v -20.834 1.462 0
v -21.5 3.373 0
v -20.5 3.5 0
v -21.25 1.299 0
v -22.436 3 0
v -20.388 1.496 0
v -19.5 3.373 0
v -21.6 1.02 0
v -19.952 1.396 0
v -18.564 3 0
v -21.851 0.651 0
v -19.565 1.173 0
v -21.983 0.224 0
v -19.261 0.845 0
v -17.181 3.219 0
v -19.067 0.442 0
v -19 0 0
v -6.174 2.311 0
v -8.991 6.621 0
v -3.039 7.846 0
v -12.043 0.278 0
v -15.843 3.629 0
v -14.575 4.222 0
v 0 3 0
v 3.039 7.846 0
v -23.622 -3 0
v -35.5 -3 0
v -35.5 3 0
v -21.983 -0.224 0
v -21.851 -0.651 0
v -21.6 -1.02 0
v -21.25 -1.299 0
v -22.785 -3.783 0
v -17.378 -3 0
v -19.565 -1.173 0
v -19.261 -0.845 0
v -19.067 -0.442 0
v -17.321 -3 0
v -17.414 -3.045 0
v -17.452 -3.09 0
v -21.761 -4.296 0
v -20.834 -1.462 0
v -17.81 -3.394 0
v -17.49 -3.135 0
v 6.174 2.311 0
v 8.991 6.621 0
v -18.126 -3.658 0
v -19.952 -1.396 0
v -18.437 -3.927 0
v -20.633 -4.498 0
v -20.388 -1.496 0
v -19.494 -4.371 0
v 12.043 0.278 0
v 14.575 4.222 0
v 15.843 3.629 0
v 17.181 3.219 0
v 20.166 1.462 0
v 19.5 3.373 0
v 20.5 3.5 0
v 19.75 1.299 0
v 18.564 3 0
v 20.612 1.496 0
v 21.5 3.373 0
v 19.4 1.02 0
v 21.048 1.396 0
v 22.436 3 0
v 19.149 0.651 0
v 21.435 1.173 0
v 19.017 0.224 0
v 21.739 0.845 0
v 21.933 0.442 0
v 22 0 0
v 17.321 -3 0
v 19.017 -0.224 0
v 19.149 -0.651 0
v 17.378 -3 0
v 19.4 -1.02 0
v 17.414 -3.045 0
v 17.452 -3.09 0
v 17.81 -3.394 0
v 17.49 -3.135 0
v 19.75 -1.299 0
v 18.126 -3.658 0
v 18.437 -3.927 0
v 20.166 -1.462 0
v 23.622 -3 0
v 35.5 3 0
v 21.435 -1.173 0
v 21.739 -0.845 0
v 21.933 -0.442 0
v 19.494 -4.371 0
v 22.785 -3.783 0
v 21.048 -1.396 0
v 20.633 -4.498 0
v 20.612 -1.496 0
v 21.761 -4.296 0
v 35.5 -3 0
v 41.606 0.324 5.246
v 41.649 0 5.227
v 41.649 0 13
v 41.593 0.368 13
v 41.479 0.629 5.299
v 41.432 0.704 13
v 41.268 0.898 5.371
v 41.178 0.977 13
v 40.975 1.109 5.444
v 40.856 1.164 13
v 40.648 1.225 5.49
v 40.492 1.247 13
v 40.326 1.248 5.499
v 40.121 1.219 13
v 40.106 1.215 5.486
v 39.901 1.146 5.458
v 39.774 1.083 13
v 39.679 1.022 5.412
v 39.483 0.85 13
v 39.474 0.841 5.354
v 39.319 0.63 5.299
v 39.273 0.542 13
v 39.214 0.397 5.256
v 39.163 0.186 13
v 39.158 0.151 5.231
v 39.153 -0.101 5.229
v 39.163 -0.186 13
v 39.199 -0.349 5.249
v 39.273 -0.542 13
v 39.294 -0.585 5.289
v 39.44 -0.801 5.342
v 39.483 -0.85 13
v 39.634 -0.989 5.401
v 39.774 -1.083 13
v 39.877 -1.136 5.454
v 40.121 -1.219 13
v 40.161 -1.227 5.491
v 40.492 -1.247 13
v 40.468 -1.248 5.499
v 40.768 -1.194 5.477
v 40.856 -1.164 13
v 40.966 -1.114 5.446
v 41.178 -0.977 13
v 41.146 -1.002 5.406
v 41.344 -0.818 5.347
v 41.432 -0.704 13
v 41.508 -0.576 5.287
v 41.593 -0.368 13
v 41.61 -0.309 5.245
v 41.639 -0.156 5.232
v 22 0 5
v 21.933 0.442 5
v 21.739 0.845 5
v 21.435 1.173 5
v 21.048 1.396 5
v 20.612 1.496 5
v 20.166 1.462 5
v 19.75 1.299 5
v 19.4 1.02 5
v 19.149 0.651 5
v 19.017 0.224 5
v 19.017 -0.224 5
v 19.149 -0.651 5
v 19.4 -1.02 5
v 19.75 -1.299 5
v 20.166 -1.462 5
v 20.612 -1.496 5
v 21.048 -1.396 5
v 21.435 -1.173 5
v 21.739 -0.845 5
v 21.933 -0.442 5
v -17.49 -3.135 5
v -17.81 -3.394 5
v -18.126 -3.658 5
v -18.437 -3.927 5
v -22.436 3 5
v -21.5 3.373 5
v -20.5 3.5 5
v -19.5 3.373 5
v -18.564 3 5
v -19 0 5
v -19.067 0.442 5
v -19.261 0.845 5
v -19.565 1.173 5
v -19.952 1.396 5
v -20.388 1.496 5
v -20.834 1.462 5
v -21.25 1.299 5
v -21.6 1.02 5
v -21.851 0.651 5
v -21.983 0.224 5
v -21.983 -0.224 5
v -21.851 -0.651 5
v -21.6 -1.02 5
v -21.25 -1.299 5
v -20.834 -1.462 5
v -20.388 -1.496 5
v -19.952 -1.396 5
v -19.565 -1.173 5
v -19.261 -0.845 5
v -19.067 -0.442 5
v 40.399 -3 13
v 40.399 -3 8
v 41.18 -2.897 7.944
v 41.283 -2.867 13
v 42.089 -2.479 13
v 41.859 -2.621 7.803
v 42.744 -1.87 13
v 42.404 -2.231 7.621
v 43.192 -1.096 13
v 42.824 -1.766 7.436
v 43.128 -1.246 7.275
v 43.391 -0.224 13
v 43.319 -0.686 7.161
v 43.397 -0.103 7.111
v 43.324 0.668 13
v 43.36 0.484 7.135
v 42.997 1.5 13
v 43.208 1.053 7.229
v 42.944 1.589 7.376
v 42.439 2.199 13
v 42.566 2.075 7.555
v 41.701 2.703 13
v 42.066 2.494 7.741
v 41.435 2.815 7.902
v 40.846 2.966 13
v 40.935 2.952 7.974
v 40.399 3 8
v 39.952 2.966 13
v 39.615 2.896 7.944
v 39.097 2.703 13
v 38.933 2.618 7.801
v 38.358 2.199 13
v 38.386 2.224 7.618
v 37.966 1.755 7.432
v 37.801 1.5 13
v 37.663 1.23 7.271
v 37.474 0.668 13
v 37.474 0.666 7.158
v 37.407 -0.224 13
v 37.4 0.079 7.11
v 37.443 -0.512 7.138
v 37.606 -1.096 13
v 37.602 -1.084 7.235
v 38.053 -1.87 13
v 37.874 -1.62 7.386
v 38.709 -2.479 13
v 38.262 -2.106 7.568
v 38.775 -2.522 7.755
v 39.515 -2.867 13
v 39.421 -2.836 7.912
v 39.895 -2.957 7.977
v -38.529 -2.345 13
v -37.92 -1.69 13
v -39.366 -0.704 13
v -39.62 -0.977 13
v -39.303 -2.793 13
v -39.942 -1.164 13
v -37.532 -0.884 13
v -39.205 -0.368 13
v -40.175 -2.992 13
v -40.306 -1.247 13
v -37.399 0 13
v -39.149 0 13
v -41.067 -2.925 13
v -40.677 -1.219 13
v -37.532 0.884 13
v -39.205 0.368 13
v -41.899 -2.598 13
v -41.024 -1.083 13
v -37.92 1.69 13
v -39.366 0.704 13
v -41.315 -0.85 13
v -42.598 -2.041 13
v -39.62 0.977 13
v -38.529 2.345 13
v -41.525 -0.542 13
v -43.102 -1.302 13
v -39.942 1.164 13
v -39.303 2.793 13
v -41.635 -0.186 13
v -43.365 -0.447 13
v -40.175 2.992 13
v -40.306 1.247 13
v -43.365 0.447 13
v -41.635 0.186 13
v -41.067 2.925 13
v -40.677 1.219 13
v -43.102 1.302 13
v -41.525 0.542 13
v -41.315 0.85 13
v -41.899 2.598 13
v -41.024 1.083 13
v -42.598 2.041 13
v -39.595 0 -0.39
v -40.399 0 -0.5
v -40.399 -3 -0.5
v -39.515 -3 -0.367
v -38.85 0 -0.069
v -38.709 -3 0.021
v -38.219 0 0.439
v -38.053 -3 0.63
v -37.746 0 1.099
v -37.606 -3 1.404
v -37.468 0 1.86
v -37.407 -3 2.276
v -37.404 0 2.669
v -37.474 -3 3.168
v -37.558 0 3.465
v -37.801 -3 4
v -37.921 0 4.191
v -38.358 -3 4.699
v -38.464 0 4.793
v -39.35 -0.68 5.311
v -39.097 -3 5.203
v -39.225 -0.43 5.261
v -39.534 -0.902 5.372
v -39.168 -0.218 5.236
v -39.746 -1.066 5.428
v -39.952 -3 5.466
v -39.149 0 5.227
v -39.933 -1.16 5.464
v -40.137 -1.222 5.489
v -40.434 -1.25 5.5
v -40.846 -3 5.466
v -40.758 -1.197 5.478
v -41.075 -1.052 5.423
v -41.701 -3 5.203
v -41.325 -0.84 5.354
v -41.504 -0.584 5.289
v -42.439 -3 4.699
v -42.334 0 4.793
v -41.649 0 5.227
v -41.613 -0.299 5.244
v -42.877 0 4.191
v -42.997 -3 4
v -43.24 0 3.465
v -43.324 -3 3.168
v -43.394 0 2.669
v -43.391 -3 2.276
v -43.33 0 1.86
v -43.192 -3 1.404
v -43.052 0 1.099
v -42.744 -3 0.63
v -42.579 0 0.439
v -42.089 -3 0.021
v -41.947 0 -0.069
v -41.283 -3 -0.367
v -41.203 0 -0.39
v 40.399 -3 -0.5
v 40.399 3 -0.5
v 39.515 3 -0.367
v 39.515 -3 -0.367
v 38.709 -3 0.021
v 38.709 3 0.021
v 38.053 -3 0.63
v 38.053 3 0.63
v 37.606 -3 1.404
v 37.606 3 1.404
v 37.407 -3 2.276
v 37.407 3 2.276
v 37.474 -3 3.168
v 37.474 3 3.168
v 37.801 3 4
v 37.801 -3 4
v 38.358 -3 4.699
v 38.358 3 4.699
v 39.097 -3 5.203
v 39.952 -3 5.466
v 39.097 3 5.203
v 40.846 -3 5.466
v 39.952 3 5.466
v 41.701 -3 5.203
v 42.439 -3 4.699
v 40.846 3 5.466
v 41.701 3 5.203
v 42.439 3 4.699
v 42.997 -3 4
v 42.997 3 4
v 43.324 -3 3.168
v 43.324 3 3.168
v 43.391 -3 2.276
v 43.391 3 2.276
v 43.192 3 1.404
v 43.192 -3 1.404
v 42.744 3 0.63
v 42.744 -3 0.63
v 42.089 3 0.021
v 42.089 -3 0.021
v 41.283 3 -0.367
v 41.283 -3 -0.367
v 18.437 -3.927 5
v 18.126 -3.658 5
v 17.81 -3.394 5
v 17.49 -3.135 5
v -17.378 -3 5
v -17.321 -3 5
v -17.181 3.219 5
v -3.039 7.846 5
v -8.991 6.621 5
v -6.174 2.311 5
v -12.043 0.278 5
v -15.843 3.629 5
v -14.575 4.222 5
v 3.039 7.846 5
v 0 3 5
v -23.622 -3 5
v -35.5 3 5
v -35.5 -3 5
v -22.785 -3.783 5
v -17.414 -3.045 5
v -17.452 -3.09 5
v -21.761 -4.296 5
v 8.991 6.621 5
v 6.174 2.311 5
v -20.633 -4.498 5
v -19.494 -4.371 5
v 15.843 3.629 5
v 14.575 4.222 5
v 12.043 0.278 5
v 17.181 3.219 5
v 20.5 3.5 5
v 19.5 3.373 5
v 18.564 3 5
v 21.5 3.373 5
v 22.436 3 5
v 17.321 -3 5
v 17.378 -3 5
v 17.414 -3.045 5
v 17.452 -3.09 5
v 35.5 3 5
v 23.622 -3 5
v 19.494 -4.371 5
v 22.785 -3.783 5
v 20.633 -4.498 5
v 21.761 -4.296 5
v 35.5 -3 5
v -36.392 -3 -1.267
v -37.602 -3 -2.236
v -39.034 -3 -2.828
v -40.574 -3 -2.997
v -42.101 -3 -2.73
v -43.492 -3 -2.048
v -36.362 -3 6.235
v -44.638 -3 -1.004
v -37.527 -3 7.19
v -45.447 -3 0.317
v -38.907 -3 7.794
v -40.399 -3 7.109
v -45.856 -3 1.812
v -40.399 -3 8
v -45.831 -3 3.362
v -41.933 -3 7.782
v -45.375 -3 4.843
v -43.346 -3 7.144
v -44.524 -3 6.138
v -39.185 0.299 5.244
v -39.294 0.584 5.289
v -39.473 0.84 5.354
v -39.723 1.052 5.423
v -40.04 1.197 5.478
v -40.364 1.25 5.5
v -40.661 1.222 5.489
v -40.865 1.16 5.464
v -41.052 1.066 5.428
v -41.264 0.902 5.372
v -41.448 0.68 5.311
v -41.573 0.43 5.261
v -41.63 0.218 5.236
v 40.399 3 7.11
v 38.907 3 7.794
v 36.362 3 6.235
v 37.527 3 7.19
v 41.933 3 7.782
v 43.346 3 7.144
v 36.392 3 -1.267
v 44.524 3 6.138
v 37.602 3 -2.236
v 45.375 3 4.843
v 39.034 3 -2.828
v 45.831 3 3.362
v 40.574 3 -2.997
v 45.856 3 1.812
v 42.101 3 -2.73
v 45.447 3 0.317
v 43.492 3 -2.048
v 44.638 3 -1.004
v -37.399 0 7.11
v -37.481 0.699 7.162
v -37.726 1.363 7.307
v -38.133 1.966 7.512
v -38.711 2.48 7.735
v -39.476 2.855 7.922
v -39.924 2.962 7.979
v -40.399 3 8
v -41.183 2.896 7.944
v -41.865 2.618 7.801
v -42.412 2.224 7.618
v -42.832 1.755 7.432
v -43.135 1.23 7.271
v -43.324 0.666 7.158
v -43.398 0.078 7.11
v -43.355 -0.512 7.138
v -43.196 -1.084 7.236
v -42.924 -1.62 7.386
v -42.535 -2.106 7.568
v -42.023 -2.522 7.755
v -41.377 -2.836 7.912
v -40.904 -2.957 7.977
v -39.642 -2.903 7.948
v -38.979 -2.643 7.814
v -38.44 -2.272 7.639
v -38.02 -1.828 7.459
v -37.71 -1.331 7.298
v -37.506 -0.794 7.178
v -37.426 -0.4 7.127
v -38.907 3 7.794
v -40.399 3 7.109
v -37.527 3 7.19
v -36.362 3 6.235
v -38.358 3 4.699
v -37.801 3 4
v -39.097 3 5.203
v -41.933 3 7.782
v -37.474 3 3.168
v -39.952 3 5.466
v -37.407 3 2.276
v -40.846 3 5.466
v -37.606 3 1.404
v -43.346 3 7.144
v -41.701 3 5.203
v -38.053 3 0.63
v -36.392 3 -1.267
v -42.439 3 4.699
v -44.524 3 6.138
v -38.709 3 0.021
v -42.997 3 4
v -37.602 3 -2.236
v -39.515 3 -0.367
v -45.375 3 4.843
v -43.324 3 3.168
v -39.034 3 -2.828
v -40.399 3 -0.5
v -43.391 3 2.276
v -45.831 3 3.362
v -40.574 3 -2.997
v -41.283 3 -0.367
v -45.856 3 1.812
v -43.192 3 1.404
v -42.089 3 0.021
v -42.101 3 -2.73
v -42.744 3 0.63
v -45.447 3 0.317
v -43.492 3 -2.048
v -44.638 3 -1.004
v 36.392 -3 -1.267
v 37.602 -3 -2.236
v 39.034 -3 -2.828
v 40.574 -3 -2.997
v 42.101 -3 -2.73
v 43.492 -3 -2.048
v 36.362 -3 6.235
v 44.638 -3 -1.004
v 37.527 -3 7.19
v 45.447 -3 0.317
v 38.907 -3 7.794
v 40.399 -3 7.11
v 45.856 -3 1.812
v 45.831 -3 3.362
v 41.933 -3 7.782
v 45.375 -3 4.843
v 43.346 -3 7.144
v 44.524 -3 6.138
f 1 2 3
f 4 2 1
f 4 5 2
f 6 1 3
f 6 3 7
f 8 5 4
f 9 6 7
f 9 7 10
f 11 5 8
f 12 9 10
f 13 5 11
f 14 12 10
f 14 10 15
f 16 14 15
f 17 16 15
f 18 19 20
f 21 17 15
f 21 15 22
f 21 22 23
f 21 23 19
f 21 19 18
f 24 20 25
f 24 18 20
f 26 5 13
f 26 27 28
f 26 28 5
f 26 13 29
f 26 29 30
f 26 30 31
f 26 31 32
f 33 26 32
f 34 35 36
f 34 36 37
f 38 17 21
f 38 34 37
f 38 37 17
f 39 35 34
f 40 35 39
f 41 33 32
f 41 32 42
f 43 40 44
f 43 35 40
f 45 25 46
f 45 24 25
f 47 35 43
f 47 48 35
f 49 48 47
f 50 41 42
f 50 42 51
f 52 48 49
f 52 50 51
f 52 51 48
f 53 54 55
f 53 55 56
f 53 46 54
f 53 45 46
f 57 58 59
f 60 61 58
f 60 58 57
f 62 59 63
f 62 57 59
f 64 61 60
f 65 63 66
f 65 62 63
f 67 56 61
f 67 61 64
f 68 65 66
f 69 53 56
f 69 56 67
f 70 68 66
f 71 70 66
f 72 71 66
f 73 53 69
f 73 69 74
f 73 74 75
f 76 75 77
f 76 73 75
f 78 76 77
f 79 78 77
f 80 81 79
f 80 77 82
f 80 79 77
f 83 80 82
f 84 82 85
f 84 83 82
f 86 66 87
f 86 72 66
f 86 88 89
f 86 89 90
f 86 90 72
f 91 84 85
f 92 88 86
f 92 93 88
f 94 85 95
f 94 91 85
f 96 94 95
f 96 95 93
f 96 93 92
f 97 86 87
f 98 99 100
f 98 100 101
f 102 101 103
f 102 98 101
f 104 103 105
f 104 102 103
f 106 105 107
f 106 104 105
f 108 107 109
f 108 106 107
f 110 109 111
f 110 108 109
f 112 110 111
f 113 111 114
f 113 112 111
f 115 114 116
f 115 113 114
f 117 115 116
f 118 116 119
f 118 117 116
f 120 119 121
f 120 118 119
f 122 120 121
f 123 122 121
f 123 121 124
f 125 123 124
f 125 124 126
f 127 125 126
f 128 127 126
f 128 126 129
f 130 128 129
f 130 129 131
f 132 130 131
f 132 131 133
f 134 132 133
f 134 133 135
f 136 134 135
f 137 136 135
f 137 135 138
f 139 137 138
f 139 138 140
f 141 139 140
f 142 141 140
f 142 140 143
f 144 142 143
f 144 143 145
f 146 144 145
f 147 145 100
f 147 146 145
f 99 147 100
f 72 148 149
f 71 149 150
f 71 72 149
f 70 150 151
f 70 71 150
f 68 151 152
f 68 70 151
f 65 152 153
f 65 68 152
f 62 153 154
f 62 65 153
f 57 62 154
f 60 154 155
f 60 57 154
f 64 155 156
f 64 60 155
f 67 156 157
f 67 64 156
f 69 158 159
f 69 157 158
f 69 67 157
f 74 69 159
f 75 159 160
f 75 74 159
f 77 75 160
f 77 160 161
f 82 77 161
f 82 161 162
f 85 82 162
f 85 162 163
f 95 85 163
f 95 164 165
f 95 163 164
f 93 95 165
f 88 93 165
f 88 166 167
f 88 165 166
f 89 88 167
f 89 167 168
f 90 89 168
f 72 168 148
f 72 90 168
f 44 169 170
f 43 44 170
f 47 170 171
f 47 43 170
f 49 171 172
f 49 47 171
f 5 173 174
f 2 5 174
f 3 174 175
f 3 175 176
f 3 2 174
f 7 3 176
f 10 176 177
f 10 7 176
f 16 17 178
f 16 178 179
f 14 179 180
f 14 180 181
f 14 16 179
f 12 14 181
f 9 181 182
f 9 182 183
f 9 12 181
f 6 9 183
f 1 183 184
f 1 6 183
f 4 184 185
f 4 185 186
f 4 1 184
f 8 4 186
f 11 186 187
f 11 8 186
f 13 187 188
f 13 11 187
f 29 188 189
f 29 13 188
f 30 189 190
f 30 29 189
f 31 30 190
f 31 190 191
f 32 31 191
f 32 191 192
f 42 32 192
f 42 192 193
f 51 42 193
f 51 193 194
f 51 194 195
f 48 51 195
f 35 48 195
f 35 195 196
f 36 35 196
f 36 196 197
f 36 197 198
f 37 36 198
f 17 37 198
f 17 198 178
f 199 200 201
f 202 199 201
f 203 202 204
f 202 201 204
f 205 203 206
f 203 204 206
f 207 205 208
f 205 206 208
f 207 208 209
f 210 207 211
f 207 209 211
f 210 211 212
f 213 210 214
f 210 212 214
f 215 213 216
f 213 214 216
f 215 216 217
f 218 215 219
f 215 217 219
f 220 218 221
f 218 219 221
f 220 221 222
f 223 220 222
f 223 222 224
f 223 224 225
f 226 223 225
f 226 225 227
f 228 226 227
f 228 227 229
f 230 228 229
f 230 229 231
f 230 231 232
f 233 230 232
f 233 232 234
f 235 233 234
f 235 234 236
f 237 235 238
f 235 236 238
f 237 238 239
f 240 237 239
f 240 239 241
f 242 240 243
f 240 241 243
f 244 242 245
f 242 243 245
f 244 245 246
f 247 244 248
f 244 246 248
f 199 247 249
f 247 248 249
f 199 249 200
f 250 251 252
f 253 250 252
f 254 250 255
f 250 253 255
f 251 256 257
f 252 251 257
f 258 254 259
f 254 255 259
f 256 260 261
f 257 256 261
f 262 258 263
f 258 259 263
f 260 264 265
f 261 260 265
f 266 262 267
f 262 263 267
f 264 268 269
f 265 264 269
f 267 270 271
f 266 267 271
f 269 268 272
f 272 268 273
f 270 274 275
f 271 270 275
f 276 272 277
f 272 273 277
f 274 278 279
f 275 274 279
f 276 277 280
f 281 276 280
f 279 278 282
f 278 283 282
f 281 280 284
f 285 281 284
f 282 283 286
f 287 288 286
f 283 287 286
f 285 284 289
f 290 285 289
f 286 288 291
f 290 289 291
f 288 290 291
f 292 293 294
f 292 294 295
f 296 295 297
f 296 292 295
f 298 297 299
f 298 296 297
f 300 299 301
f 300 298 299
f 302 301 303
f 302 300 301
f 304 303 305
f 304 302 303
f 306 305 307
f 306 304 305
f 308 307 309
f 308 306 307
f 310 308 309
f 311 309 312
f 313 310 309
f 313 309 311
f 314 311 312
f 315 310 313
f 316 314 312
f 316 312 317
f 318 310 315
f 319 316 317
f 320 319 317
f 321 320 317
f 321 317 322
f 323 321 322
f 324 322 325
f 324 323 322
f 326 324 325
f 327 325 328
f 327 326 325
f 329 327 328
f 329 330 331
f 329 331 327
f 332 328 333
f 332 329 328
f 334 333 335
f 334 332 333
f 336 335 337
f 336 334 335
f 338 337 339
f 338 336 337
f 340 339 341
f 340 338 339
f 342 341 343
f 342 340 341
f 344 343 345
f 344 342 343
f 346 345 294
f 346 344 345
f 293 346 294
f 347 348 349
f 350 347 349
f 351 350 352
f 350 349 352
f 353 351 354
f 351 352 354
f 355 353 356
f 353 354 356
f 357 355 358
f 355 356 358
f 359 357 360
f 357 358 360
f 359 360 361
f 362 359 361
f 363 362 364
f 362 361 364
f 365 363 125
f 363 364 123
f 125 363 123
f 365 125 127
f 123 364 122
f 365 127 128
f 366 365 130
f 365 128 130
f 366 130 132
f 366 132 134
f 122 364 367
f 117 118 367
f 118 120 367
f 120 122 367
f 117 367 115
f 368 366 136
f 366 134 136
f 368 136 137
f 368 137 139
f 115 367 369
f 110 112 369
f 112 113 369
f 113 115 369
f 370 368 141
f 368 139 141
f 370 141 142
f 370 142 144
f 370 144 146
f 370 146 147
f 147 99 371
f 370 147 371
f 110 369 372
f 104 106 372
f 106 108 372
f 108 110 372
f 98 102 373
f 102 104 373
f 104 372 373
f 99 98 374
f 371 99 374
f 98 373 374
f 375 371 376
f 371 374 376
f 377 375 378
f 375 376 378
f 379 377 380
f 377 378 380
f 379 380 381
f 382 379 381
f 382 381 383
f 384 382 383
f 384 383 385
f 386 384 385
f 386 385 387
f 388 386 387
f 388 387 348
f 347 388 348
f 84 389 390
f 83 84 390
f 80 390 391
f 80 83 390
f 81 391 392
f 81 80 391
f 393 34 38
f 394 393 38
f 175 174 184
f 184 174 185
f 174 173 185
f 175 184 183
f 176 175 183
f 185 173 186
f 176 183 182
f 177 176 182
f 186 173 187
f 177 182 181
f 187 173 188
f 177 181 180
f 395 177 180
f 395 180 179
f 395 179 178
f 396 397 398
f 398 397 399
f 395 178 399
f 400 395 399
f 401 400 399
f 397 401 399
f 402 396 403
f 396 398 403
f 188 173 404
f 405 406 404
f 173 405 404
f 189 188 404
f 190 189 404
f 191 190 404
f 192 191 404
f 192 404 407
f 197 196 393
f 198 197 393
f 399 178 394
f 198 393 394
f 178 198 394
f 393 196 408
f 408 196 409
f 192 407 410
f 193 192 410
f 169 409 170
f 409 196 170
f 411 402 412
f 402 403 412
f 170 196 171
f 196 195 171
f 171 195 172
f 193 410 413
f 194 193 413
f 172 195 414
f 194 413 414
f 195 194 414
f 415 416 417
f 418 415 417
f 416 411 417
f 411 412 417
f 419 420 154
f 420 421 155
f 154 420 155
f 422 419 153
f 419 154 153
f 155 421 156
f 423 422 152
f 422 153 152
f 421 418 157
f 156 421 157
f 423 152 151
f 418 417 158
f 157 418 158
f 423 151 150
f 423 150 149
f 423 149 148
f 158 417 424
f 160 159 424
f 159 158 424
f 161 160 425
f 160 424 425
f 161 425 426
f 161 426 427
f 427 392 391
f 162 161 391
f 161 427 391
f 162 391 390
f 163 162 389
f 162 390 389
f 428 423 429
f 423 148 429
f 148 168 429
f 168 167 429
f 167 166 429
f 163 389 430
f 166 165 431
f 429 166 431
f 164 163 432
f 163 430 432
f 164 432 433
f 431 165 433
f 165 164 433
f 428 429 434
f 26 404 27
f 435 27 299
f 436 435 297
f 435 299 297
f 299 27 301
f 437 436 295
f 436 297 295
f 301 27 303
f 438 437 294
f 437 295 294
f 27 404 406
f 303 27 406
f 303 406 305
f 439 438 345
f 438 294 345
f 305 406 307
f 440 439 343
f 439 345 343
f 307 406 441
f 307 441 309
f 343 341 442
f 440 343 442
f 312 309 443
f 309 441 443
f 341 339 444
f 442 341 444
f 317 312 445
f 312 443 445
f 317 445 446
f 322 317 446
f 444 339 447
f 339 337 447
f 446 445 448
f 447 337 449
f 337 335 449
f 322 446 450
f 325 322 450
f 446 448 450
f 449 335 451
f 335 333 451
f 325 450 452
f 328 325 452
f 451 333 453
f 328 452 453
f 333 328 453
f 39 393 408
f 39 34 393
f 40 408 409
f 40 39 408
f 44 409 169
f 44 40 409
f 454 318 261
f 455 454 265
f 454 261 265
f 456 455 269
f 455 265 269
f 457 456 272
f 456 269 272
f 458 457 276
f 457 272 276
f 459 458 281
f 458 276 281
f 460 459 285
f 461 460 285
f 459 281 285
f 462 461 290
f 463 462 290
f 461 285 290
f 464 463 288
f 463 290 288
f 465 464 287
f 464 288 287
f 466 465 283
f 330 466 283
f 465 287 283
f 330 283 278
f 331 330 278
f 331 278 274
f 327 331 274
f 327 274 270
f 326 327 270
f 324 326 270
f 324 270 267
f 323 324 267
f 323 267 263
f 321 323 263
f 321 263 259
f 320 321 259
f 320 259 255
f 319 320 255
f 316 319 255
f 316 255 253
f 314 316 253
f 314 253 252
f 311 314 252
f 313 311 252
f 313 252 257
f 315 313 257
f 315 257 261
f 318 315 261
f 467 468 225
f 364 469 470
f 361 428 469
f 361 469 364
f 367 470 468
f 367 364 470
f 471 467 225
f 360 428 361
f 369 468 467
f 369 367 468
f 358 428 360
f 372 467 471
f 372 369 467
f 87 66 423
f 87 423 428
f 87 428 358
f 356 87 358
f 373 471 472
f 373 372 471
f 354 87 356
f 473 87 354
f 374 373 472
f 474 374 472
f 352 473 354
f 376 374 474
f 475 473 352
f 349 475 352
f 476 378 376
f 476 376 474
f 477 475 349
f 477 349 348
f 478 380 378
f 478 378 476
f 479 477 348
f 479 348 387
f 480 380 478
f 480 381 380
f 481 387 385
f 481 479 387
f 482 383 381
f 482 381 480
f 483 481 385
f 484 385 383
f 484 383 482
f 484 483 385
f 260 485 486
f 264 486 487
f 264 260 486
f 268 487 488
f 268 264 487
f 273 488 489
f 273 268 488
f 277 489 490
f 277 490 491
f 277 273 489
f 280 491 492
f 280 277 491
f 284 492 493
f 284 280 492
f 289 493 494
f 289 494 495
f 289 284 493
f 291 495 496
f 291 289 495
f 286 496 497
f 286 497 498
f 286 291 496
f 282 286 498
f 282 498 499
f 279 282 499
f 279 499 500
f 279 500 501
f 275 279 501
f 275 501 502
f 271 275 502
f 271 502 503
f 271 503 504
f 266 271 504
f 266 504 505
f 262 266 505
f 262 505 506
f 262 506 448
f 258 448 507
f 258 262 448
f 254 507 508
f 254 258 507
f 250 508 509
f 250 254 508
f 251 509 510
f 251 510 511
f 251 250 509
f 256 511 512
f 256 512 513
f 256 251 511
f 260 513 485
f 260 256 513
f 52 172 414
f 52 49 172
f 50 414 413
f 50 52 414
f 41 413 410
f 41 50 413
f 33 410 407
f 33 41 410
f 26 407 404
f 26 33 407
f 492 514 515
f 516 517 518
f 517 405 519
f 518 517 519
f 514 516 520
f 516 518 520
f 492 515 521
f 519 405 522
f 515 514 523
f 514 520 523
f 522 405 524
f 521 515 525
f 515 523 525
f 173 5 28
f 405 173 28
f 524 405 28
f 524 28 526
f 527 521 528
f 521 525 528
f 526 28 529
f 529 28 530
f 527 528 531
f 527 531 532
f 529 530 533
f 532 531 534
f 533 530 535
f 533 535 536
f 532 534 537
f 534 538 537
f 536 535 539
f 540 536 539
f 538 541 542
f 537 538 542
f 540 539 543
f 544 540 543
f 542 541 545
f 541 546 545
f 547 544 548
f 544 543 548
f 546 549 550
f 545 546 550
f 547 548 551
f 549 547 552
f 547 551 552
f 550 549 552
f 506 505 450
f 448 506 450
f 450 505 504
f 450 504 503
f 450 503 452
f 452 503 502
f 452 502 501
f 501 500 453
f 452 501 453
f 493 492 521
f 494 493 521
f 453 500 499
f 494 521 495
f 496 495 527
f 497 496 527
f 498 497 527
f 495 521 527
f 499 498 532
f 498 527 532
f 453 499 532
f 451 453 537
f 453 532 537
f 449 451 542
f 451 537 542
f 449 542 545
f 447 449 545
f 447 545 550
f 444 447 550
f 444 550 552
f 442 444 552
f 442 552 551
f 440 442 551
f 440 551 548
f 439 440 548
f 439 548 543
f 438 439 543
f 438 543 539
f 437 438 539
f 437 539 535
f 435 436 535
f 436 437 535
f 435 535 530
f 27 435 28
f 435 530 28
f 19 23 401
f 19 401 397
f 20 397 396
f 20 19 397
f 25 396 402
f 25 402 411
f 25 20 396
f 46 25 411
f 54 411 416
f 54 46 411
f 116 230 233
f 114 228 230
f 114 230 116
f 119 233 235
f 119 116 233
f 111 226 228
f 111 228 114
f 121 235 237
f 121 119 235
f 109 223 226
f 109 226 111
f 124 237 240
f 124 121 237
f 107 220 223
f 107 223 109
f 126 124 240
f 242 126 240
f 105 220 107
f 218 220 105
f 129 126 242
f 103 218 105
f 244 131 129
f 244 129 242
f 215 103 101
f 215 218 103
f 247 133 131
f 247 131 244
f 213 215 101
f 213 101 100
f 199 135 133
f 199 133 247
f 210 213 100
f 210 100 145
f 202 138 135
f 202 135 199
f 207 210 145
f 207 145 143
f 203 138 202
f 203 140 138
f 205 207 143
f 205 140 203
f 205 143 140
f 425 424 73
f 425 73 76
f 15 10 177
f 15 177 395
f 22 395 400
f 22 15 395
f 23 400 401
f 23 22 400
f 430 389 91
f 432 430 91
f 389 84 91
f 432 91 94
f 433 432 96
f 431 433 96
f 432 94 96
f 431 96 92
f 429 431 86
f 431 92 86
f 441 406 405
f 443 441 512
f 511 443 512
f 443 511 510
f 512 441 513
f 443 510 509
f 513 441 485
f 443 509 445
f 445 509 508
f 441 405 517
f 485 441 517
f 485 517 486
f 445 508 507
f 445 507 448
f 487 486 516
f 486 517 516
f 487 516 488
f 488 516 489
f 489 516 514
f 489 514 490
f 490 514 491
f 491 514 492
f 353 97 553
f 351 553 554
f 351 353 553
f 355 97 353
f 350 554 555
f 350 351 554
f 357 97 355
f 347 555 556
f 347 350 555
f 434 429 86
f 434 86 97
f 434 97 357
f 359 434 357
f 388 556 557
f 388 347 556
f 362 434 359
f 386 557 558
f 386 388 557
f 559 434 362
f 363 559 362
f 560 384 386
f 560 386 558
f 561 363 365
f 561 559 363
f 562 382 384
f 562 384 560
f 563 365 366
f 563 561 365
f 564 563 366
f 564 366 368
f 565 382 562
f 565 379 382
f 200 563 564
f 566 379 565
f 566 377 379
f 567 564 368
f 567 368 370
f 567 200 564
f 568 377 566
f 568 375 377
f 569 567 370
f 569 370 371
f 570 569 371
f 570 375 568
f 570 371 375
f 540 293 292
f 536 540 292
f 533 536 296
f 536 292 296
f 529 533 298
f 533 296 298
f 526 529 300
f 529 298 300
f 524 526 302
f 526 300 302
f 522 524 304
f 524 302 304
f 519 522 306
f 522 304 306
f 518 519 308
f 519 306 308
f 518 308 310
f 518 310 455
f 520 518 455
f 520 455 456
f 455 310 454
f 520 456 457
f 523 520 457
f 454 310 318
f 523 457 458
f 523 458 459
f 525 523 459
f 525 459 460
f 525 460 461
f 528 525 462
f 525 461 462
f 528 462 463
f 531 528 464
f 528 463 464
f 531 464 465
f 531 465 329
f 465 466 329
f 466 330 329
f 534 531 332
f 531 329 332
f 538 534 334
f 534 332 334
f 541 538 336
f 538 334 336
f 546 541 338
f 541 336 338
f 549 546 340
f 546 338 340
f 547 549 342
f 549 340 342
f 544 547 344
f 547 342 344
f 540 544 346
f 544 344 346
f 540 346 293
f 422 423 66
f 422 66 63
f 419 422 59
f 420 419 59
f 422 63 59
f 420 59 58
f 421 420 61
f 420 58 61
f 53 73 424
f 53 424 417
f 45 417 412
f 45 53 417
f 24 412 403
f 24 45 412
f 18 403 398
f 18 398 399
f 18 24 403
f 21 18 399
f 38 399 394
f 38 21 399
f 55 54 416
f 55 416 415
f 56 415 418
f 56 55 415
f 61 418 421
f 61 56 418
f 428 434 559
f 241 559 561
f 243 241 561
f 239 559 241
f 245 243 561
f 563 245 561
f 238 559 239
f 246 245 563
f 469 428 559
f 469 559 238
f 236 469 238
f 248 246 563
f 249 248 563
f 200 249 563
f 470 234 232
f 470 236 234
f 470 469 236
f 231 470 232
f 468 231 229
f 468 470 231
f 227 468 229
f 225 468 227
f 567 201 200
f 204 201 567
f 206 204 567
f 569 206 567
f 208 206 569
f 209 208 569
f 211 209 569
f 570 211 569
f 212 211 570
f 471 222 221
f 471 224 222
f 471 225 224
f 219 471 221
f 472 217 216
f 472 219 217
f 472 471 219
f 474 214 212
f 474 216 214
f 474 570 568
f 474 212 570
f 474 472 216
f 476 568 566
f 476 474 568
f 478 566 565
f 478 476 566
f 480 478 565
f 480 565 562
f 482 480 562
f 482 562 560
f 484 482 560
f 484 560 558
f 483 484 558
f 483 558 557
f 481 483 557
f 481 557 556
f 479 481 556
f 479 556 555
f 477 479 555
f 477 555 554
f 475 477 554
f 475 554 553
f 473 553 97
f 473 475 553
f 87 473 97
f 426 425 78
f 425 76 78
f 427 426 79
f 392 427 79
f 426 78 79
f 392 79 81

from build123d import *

# Parameters (mm, degrees)
SKETCH1_W                       = 71
SKETCH1_H                       = 6
BOSS_EXTRUDE1_DEPTH             = 5
SKETCH2_R                       = 1.5
CUT_EXTRUDE1_DEPTH              = 36.975686234
SKETCH3_R                       = 4
SKETCH3_R_2                     = 1.5
BOSS_EXTRUDE2_DEPTH             = 5
BOSS_EXTRUDE4_DEPTH             = 5
SKETCH5_R                       = 28
CUT_EXTRUDE3_DEPTH              = 5
FILLET1_R                       = 10
BOSS_EXTRUDE5_REACH             = 38.732
SKETCH6_R                       = 5.5
SKETCH6_R_2                     = 3
BOSS_EXTRUDE5_DIRECTION_2_REACH = 38.732
BOSS_EXTRUDE6_START             = -0.890228
SKETCH7_R                       = 3
SKETCH7_R_2                     = 1.25
BOSS_EXTRUDE6_DEPTH             = 5.890228
CUT_EXTRUDE4_START              = -5
SKETCH8_R                       = 1.25
CUT_EXTRUDE4_DEPTH              = 5
MIRROR7_OUTLINE_W               = 3
MIRROR7_OUTLINE_H               = 5.890504749
CUT_EXTRUDE5_REACH              = 51.262
CUT_EXTRUDE5_END_RADIUS         = 3
SKETCH9_R                       = 1.25


# Read off the part's stored shape, not the designer's step: Mirror7
with BuildPart() as part:
    # Sketch1 → Boss-Extrude1 (new body)
    with BuildSketch(Plane.XY):
        Rectangle(SKETCH1_W, SKETCH1_H)
    extrude(amount=BOSS_EXTRUDE1_DEPTH)

    # Sketch2 → Cut-Extrude1 (cut, through all)
    with BuildSketch(Plane.XY):
        with Locations((20.5, 0)):
            Circle(SKETCH2_R)
        with Locations((-20.5, 0)):
            Circle(SKETCH2_R)
    extrude(amount=CUT_EXTRUDE1_DEPTH, mode=Mode.SUBTRACT)

    # Sketch3 → Boss-Extrude2 (add)
    with BuildSketch(Plane.XY):
        with Locations((20.5, -0.5)):
            Circle(SKETCH3_R)
        with Locations((20.5, 0)):
            Circle(SKETCH3_R_2, mode=Mode.SUBTRACT)
    boss_extrude2 = extrude(amount=BOSS_EXTRUDE2_DEPTH)

    # Mirror1: Boss-Extrude2 across plane
    add(boss_extrude2.mirror(Plane(origin=(0, 0, 0), x_dir=(0, 0, 1), z_dir=(1, 0, 0))))

    # Sketch4 → Boss-Extrude4 (add)
    with BuildSketch(Plane.XY):
        with BuildLine():
            Line((16.583123952, 3), (-16.583123952, 3))
            ThreePointArc((-16.583123952, 3), (0, 8), (16.583123952, 3))
        make_face()
    extrude(amount=BOSS_EXTRUDE4_DEPTH)

    # Sketch5 → Cut-Extrude3 (cut)
    with BuildSketch(Plane.XY):
        with Locations((0, -25)):
            Circle(SKETCH5_R)
    extrude(amount=CUT_EXTRUDE3_DEPTH, mode=Mode.SUBTRACT)

    # Fillet1
    # the kernel refuses this fillet: 10 mm, written as the material it adds along each edge
    with BuildSketch(Plane(origin=(-16.583123952, 3, 0), x_dir=(-1, 0, 0), z_dir=(0, 0, 1))) as fillet1_piece_1:
        with BuildLine():
            CenterArc((2.85012487, -9.962105775), FILLET1_R, 94.989550063, 24.077396017)
            Line((-2.008187335, -1.221579331), (-2.105353579, -1.046768802))
            ThreePointArc((-2.105353579, -1.046768802), (-1.096064984, -0.459595529), (-0.11055416, 0.166666667))
            Line((-0.11055416, 0.166666667), (0, 0.2))
            ThreePointArc((0, 0.2), (0.990192188, 0.2), (1.962989565, 0.199242115))
            Line((1.962989565, 0.199242115), (1.980384375, 0))
        make_face()
    extrude(amount=5)
    with BuildSketch(Plane(origin=(16.583123952, 3, 0), x_dir=(-0.8543488432646742, 0.5196999653764787, 0), z_dir=(0, 0, 1))) as fillet1_piece_2:
        with BuildLine():
            CenterArc((2.74230514, -9.992323342), FILLET1_R, 92.245181841, 24.077396017)
            Line((-1.6919391, -1.029205691), (-1.780623985, -0.849943338))
            ThreePointArc((-1.780623985, -0.849943338), (-0.949909543, -0.343733077), (-0.103939993, 0.170869769))
            Line((-0.103939993, 0.170869769), (0.007835158, 0.199846467))
            ThreePointArc((0.007835158, 0.199846467), (1.175273632, 0.176970025), (2.342712105, 0.199846467))
            Line((2.342712105, 0.199846467), (2.350547263, 0))
        make_face()
    extrude(amount=5)

    # Boss-Extrude5: up to this face of the body (flat: up to its plane)
    boss_extrude5_end = Plane(part.part.faces().sort_by_distance((28.968245837, 3, 2.5))[0])
    # Sketch6 → Boss-Extrude5 (add, up to the picked face)
    with BuildSketch(Plane(origin=(0, 0, 0), x_dir=(1, 0, 0), z_dir=(0, 1, 0)), mode=Mode.PRIVATE) as boss_extrude5_sk1:
        with Locations((40.398979486, -2.5)):
            Circle(SKETCH6_R)
        with Locations(Location((40.398979486, -2.5, 0), (0, 0, 90))):
            Circle(SKETCH6_R_2, mode=Mode.SUBTRACT)
    boss_extrude5_tool1 = split(extrude(boss_extrude5_sk1.sketch, amount=BOSS_EXTRUDE5_REACH, mode=Mode.PRIVATE), bisect_by=boss_extrude5_end, keep=Keep.BOTH, mode=Mode.PRIVATE)
    boss_extrude5 = boss_extrude5_tool1.solids().sort_by(Axis((35.054543, 0, 2.5), (0, 1, 0)))[0]
    add(boss_extrude5)

    # Boss-Extrude5 direction 2: up to this face of the body (flat: up to its plane)
    boss_extrude5_direction_2_end = Plane(part.part.faces().sort_by_distance((29.5612495, -3, 2.5))[0])
    # Sketch6 → Boss-Extrude5 direction 2 (add, up to the picked face)
    with BuildSketch(Plane(origin=(0, 0, 0), x_dir=(1, 0, 0), z_dir=(0, 1, 0)), mode=Mode.PRIVATE) as boss_extrude5_direction_2_sk1:
        with Locations((40.398979486, -2.5)):
            Circle(SKETCH6_R)
        with Locations(Location((40.398979486, -2.5, 0), (0, 0, 90))):
            Circle(SKETCH6_R_2, mode=Mode.SUBTRACT)
    boss_extrude5_direction_2_tool1 = split(extrude(boss_extrude5_direction_2_sk1.sketch, amount=-BOSS_EXTRUDE5_DIRECTION_2_REACH, mode=Mode.PRIVATE), bisect_by=boss_extrude5_direction_2_end, keep=Keep.BOTH, mode=Mode.PRIVATE)
    boss_extrude5_direction_2 = boss_extrude5_direction_2_tool1.solids().sort_by(Axis((35.054543, 0, 2.5), (0, -1, 0)))[0]
    add(boss_extrude5_direction_2)

    # Sketch7 → Boss-Extrude6 (add)
    with BuildSketch(Plane.XY.offset(8).offset(BOSS_EXTRUDE6_START)):
        with Locations(Location((40.398979486, 0, 0), (0, 0, 269.999999959))):
            Circle(SKETCH7_R)
        with Locations((40.398979486, 0)):
            Circle(SKETCH7_R_2, mode=Mode.SUBTRACT)
    extrude(amount=BOSS_EXTRUDE6_DEPTH)

    # Sketch8 → Cut-Extrude4 (cut)
    with BuildSketch(Plane.XY.offset(8).offset(CUT_EXTRUDE4_START)):
        with Locations((40.398979486, 0)):
            Circle(SKETCH8_R)
    extrude(amount=CUT_EXTRUDE4_DEPTH, mode=Mode.SUBTRACT)

    # Mirror5: Boss-Extrude5, Boss-Extrude5 direction 2 across plane
    add(boss_extrude5.mirror(Plane(origin=(0, 0, 0), x_dir=(0, 0, 1), z_dir=(1, 0, 0))))
    add(boss_extrude5_direction_2.mirror(Plane(origin=(0, 0, 0), x_dir=(0, 0, 1), z_dir=(1, 0, 0))))

    # Mirror7 outline → Mirror7 (revolve)
    with BuildSketch(Plane(origin=(-40.398979486, 0, 0), x_dir=(1, 0, 0), z_dir=(0, -1, 0))):
        with Locations((1.5, 10.054747625)):
            Rectangle(MIRROR7_OUTLINE_W, MIRROR7_OUTLINE_H)
    revolve(axis=Axis((-40.398979486, 0, 0), (0, 0, 1)))

    # Cut-Extrude5: up to this cylinder (the profile starts outside it)
    cut_extrude5_end = Plane(origin=(-40.398979486, 0, 2.5), z_dir=(0, -1, 0)) * Cylinder(CUT_EXTRUDE5_END_RADIUS, 109.524, mode=Mode.PRIVATE)
    # Sketch9 → Cut-Extrude5 (cut, up to the surface)
    with BuildSketch(Plane.XY.offset(13), mode=Mode.PRIVATE) as cut_extrude5_sk1:
        with Locations((-40.398979486, 0)):
            Circle(SKETCH9_R)
    cut_extrude5_tool1 = extrude(cut_extrude5_sk1.sketch, amount=-CUT_EXTRUDE5_REACH, mode=Mode.PRIVATE) - cut_extrude5_end
    add(cut_extrude5_tool1.solids().sort_by_distance((-40.398979, 0, 13))[0], mode=Mode.SUBTRACT)


solid = part.part
